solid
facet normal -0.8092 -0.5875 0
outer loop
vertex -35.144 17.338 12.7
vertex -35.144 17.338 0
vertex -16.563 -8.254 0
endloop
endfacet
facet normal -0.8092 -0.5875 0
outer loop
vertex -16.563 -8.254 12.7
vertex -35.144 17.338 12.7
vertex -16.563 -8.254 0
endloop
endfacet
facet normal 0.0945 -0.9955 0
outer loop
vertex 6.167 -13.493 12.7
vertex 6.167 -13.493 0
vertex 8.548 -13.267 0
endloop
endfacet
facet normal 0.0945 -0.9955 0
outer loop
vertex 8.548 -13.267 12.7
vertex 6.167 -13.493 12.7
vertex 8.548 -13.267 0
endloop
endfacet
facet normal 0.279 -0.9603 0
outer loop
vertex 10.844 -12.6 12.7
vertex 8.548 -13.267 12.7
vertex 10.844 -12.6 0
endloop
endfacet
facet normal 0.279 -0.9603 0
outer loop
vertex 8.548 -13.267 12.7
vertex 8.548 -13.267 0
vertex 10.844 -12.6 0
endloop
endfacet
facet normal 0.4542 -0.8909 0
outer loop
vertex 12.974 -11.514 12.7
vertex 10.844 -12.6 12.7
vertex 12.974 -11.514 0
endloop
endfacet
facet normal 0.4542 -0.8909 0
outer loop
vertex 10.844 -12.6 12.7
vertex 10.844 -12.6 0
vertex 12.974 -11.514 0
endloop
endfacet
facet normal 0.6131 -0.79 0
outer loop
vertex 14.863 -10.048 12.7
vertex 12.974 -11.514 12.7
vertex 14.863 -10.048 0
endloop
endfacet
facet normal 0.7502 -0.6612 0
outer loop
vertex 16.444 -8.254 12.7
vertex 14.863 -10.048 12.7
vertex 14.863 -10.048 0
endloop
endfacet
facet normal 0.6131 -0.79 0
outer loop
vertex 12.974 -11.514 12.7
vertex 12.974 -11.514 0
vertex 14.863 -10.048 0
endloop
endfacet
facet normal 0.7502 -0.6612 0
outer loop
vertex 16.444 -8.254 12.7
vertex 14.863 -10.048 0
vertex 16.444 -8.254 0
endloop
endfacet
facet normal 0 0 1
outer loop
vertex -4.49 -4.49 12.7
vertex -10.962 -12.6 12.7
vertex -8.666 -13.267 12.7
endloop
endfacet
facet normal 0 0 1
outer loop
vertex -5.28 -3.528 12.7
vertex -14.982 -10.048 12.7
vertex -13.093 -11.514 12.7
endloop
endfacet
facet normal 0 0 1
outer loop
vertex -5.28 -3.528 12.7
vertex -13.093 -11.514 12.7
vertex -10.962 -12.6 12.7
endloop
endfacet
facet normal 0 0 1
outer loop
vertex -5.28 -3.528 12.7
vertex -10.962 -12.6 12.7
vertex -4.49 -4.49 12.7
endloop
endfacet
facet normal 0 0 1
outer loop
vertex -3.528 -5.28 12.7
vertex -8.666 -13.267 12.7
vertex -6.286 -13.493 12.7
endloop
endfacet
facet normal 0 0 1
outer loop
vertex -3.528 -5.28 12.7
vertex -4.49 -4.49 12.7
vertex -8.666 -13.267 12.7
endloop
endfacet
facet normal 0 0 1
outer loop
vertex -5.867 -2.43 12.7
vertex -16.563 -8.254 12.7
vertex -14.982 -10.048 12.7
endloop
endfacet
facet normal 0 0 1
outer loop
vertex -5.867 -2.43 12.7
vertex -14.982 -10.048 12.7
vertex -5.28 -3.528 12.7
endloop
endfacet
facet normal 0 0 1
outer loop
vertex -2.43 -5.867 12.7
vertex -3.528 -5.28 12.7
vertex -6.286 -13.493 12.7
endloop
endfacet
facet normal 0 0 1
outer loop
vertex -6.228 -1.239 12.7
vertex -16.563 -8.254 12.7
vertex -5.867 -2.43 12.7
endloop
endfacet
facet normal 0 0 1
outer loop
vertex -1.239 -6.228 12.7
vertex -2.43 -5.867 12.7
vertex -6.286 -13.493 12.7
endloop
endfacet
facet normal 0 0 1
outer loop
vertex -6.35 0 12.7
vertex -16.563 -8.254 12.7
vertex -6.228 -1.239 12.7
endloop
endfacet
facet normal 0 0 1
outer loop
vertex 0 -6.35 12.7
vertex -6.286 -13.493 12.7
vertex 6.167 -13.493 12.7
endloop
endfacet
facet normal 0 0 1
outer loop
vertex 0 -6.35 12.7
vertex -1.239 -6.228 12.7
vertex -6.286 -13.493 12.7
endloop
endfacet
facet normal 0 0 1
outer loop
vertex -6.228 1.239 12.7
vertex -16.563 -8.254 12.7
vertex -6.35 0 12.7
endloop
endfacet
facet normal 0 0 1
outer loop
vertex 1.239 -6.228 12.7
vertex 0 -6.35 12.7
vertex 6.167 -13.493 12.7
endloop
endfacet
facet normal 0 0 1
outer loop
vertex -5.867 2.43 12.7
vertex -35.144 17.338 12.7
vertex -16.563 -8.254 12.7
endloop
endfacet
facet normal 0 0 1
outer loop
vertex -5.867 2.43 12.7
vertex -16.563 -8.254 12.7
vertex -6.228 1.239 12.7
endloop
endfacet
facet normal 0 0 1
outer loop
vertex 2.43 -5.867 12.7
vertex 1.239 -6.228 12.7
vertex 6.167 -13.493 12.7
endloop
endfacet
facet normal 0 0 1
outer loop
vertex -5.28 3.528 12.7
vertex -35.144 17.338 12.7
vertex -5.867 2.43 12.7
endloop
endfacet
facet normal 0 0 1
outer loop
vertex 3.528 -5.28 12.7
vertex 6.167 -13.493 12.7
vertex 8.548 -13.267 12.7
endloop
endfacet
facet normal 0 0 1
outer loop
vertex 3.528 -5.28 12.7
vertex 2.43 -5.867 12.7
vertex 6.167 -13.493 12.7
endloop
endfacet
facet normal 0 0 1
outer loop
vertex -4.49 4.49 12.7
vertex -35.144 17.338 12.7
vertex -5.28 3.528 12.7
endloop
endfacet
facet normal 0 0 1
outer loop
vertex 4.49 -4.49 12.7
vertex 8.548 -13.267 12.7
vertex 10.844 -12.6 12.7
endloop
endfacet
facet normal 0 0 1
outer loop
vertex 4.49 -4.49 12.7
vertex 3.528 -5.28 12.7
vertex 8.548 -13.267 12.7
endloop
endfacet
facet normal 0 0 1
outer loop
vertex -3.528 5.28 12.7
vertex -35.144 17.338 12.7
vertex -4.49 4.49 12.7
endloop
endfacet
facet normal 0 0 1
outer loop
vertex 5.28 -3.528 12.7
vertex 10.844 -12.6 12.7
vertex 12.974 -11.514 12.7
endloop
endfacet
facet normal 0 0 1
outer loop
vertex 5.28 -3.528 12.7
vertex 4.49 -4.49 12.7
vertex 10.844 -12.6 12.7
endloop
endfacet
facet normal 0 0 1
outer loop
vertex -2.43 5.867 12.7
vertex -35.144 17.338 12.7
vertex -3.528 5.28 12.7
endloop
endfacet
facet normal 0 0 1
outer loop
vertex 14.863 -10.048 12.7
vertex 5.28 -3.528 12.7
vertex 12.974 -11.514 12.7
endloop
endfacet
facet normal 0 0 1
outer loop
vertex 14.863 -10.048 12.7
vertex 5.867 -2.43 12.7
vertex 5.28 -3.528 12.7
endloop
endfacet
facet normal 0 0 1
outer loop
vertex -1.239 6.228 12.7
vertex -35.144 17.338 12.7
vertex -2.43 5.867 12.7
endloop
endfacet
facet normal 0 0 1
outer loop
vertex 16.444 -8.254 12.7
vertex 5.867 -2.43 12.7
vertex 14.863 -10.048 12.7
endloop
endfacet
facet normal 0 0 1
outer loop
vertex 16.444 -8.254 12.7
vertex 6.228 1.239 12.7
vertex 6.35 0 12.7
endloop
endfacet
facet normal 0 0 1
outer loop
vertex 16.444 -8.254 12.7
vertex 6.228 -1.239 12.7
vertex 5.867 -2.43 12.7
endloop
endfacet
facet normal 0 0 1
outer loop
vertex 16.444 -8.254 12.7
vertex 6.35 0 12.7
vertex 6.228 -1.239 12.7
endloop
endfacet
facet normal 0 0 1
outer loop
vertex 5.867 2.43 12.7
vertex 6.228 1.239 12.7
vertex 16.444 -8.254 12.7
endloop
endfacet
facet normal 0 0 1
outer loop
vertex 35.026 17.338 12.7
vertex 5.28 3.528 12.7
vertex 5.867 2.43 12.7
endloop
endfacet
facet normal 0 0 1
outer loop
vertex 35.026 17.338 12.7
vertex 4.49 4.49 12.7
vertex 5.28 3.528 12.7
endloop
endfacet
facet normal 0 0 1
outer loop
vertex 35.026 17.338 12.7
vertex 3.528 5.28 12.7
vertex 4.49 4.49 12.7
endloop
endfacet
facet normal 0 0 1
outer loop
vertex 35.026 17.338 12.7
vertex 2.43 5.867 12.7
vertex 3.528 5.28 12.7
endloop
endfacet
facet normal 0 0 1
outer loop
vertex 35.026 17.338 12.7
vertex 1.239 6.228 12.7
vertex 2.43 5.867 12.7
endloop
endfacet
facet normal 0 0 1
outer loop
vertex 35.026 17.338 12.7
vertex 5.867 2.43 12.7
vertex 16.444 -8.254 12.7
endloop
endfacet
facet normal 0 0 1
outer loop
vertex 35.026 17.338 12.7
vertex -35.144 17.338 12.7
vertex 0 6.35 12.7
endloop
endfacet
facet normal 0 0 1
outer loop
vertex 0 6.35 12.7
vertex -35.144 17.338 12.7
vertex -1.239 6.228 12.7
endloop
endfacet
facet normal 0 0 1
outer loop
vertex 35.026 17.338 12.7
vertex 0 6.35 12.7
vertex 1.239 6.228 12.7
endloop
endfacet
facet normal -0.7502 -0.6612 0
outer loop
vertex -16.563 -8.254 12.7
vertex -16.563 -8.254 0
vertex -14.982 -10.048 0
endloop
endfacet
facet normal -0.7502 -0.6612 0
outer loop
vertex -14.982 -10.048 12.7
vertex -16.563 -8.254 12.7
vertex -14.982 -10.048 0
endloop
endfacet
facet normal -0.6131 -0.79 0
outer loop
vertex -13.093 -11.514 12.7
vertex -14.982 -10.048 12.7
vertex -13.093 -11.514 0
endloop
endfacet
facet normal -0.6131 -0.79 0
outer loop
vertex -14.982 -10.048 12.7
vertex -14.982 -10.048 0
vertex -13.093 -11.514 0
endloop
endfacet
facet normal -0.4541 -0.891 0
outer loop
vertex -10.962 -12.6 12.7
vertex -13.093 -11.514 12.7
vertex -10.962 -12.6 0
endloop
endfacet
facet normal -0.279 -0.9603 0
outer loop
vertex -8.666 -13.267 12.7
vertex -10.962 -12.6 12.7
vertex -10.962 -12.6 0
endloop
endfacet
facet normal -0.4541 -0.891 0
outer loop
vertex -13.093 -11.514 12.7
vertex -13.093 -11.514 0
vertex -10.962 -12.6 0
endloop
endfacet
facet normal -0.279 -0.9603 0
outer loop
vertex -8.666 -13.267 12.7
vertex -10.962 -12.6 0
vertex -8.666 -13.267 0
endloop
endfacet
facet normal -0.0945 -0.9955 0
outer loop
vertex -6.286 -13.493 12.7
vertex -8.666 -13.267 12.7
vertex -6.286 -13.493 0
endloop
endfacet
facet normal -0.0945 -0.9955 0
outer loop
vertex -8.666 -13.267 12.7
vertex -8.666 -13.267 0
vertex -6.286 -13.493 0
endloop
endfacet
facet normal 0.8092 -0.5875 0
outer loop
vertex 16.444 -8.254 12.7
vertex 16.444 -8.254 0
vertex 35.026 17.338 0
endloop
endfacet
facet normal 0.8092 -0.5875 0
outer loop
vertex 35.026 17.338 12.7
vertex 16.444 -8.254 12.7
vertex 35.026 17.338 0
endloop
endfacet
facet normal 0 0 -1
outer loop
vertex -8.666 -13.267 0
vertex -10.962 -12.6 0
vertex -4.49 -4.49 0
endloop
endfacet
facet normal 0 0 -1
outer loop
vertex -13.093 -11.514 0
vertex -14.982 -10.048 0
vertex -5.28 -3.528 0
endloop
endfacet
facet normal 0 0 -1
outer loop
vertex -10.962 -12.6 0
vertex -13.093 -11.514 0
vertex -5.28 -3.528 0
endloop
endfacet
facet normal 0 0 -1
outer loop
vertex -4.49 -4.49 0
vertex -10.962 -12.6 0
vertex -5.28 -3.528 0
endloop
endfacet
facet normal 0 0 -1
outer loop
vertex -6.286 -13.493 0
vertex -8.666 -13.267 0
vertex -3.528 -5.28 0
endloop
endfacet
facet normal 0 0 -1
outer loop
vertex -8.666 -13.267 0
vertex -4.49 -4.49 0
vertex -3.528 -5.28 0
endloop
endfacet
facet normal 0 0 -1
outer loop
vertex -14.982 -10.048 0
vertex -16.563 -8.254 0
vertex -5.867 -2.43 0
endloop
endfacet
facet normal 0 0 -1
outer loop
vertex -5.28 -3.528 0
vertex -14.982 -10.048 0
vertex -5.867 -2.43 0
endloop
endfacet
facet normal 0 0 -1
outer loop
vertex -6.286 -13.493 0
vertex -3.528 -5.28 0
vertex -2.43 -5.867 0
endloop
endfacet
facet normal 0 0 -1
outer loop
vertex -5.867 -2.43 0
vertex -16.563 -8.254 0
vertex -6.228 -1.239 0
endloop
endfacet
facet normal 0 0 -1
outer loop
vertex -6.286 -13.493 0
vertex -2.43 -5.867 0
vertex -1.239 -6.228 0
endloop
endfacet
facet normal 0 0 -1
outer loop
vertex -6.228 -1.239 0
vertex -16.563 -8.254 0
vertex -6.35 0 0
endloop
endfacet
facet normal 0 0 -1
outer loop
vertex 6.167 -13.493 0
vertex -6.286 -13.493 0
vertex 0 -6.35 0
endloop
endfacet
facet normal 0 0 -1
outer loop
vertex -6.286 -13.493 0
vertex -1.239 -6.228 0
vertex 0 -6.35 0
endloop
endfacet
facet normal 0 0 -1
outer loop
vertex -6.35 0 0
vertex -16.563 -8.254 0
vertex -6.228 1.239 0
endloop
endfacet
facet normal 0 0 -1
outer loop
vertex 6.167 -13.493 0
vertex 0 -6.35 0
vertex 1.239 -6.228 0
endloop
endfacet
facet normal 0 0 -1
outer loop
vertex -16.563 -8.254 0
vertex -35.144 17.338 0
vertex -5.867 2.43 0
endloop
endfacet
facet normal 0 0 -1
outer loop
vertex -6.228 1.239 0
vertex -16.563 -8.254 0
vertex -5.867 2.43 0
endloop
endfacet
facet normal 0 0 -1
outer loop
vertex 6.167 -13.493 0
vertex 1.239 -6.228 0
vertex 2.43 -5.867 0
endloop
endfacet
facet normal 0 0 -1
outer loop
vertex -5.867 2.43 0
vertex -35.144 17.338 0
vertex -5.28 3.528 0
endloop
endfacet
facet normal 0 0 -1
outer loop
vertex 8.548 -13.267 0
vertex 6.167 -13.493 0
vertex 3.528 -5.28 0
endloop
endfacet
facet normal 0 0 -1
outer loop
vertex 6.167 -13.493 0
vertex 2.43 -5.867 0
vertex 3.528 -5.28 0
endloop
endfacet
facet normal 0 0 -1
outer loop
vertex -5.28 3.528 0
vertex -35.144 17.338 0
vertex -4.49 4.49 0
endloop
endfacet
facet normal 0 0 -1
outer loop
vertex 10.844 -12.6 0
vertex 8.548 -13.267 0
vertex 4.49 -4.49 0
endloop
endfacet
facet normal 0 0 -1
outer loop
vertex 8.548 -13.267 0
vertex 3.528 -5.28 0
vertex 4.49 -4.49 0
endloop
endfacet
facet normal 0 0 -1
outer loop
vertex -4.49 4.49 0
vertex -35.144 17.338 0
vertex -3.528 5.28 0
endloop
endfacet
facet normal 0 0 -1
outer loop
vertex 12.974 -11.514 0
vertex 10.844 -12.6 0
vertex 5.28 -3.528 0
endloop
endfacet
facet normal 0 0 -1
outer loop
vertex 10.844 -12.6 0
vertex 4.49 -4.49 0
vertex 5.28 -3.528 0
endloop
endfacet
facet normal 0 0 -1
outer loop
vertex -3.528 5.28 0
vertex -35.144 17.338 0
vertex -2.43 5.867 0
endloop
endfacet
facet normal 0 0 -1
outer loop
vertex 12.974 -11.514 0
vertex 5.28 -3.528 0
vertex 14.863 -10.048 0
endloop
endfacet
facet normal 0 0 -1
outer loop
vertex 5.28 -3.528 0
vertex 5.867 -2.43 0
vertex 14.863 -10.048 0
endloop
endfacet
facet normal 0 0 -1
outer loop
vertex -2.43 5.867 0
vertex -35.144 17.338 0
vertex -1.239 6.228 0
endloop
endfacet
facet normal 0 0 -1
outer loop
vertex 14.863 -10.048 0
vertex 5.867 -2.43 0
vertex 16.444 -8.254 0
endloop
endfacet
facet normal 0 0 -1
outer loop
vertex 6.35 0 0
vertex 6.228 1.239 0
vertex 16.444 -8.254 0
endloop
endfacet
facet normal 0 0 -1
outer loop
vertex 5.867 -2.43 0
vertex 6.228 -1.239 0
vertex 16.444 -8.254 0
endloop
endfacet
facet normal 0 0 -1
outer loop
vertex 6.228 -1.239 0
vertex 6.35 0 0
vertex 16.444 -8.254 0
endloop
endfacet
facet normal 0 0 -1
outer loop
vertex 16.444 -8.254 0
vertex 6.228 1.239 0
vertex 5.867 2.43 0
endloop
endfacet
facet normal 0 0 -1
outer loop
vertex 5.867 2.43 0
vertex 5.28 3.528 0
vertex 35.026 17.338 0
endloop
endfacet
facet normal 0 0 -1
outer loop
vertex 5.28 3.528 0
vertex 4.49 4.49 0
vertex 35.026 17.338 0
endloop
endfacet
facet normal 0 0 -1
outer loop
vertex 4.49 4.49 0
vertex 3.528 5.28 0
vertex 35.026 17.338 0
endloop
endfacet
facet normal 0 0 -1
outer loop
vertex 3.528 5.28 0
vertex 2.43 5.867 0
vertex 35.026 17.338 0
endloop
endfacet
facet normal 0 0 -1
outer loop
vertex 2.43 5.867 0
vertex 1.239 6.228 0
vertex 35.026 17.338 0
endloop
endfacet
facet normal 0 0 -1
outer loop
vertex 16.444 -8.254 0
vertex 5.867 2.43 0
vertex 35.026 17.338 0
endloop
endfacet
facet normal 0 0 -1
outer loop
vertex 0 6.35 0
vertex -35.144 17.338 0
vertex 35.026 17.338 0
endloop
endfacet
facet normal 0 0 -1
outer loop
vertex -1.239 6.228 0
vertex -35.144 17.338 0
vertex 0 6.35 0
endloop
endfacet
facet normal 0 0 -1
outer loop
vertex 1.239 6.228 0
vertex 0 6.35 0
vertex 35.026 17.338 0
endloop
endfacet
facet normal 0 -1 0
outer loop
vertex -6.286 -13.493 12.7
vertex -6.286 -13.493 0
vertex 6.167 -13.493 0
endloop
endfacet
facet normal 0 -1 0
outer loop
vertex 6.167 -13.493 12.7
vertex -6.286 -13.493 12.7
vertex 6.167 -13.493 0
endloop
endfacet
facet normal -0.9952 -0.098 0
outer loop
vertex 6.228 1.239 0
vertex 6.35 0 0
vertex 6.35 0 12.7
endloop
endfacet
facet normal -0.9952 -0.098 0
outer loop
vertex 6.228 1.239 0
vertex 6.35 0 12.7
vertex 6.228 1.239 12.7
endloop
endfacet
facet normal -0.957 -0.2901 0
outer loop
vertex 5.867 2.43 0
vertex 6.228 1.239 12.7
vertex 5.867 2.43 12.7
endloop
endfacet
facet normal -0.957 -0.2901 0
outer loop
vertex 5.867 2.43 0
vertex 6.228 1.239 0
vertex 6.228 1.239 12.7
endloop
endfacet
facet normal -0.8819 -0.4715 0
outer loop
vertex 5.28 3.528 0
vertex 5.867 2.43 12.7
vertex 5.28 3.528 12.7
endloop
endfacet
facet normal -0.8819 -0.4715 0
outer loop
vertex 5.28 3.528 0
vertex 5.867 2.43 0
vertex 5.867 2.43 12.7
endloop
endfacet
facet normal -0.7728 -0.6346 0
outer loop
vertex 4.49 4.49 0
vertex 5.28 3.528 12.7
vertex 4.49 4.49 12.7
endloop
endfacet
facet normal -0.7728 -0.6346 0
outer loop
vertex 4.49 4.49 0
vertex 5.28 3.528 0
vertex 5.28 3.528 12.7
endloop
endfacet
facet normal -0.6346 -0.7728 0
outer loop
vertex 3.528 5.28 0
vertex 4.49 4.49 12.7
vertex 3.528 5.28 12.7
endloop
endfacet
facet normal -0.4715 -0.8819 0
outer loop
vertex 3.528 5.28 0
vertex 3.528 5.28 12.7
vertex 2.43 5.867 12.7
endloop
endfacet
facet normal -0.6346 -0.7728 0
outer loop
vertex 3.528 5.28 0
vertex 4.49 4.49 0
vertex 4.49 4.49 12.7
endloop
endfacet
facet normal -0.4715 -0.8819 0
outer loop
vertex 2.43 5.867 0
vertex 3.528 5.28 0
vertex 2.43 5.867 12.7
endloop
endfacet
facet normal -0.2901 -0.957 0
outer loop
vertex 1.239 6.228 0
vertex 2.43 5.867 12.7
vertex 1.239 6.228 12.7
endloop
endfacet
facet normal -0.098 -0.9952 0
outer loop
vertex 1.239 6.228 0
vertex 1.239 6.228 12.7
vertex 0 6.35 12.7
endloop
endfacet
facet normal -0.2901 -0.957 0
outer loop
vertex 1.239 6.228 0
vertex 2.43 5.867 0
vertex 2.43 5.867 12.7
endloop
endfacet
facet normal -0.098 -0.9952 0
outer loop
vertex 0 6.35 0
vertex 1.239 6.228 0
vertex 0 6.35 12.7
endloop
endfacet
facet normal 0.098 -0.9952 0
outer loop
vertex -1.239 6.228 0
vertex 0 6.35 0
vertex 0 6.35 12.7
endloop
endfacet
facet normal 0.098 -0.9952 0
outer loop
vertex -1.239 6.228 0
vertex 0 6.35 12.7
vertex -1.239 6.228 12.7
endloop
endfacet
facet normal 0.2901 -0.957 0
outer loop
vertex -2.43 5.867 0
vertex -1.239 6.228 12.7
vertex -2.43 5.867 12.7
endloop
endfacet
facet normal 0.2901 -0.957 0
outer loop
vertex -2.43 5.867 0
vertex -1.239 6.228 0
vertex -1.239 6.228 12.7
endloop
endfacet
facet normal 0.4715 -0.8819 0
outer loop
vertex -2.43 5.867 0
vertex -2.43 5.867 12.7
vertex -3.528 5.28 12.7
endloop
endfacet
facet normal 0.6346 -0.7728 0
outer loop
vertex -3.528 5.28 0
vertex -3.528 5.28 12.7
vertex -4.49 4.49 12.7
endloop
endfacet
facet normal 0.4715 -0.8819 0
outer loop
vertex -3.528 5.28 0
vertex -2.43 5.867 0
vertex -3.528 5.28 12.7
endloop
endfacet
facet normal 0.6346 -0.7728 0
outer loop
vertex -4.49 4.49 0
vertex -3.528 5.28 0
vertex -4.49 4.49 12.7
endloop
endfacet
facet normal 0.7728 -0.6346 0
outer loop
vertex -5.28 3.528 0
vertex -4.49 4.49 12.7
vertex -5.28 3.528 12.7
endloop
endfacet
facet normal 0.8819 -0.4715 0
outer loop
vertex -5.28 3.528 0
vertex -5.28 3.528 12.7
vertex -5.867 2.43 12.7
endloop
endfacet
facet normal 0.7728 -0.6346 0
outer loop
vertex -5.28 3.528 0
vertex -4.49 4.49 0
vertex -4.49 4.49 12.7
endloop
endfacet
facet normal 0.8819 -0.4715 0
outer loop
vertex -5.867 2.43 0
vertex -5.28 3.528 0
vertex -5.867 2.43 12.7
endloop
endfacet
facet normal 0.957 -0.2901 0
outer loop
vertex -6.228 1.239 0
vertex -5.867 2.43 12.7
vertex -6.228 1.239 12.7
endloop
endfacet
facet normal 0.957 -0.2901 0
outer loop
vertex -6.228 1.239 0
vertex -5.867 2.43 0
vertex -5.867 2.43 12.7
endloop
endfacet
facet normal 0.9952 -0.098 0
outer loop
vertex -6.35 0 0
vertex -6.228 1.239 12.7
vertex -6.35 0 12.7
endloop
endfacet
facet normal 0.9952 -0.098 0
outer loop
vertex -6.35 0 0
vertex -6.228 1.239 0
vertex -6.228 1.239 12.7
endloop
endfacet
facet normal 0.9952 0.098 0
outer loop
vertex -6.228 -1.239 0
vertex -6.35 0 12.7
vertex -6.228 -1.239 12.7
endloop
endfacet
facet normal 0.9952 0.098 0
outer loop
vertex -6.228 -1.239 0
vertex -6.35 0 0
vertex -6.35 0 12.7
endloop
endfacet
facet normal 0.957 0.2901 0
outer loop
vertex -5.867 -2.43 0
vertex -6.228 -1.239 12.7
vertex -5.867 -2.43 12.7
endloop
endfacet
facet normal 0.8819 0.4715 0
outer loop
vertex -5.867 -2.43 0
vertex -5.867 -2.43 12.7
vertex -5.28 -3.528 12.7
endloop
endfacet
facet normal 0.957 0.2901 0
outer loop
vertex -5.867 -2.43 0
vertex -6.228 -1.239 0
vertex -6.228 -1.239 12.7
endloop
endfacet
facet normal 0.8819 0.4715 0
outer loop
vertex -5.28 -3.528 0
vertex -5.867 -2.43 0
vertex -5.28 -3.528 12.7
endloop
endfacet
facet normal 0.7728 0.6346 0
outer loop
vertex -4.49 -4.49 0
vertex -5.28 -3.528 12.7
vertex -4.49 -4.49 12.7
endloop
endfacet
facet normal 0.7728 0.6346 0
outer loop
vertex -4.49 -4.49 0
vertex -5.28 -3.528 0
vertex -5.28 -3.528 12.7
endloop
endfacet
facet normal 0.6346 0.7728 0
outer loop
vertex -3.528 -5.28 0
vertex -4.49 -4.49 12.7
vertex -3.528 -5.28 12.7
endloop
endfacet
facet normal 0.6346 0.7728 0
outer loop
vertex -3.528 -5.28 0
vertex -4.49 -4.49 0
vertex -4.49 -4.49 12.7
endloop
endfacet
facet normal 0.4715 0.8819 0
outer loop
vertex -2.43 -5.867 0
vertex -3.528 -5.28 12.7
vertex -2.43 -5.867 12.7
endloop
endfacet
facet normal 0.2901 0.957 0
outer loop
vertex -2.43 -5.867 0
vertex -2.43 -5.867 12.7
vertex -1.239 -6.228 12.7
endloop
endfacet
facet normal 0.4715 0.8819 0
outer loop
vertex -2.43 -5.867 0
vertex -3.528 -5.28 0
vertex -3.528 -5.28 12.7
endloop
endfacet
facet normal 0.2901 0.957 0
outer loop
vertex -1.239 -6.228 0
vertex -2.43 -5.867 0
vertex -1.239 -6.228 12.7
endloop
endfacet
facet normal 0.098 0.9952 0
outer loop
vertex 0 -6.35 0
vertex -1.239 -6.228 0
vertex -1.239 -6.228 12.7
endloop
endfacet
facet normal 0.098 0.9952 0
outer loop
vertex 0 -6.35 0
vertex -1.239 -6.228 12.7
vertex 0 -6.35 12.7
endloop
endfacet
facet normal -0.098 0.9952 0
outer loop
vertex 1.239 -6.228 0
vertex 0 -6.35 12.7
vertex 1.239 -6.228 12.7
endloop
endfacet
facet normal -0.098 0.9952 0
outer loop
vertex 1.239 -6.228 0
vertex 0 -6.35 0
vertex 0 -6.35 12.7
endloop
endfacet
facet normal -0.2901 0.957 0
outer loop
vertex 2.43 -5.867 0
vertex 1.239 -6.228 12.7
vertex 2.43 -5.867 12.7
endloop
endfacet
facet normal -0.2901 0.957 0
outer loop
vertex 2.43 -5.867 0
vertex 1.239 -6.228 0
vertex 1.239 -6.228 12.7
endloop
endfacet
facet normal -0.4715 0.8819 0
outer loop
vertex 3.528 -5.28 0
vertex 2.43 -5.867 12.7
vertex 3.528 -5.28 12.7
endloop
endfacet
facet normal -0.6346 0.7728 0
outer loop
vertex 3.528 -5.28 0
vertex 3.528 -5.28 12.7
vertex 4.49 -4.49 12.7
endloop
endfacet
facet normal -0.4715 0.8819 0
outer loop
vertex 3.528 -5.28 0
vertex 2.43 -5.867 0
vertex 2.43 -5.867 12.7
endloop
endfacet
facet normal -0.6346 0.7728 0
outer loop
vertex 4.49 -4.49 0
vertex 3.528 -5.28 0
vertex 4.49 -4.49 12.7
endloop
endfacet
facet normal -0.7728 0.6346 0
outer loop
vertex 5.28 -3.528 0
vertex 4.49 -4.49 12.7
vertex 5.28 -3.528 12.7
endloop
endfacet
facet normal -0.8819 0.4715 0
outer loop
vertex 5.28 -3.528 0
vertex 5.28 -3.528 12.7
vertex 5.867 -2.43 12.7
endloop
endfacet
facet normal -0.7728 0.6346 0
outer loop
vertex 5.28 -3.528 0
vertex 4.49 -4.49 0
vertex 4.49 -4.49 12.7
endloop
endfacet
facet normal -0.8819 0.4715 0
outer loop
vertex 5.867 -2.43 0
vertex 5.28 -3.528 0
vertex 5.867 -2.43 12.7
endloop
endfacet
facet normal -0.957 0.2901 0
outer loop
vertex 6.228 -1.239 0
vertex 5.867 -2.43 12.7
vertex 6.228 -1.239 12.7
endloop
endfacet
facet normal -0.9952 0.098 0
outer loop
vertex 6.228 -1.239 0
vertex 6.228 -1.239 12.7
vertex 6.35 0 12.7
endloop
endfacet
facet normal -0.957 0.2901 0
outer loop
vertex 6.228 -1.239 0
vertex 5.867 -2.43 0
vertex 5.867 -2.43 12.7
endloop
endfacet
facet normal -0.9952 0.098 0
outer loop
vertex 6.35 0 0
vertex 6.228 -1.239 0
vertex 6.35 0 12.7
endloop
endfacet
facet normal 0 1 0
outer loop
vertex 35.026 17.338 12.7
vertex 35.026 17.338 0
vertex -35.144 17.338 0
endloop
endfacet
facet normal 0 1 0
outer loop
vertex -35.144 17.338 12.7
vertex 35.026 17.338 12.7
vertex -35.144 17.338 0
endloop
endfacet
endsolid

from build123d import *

# Parameters (mm, degrees)
F0_R     = 6.35
F1_DEPTH = 12.7


with BuildPart() as f1:
    # F0 (on Top) → F1 (new body)
    with BuildSketch(Plane.XY):
        with BuildLine():
            Line((35.025607, 17.338161), (-35.143936, 17.338161))
            Line((-35.143936, 17.338161), (-16.562536, -8.254128))
            ThreePointArc((-16.562536, -8.254128), (-12.053122, -12.1074), (-6.285636, -13.492538))
            Line((-6.285636, -13.492538), (6.167308, -13.492538))
            ThreePointArc((6.167308, -13.492538), (11.934794, -12.1074), (16.444207, -8.254128))
            Line((16.444207, -8.254128), (35.025607, 17.338161))
        make_face()
        Circle(F0_R, mode=Mode.SUBTRACT)
    extrude(amount=F1_DEPTH)


solid = f1.part
